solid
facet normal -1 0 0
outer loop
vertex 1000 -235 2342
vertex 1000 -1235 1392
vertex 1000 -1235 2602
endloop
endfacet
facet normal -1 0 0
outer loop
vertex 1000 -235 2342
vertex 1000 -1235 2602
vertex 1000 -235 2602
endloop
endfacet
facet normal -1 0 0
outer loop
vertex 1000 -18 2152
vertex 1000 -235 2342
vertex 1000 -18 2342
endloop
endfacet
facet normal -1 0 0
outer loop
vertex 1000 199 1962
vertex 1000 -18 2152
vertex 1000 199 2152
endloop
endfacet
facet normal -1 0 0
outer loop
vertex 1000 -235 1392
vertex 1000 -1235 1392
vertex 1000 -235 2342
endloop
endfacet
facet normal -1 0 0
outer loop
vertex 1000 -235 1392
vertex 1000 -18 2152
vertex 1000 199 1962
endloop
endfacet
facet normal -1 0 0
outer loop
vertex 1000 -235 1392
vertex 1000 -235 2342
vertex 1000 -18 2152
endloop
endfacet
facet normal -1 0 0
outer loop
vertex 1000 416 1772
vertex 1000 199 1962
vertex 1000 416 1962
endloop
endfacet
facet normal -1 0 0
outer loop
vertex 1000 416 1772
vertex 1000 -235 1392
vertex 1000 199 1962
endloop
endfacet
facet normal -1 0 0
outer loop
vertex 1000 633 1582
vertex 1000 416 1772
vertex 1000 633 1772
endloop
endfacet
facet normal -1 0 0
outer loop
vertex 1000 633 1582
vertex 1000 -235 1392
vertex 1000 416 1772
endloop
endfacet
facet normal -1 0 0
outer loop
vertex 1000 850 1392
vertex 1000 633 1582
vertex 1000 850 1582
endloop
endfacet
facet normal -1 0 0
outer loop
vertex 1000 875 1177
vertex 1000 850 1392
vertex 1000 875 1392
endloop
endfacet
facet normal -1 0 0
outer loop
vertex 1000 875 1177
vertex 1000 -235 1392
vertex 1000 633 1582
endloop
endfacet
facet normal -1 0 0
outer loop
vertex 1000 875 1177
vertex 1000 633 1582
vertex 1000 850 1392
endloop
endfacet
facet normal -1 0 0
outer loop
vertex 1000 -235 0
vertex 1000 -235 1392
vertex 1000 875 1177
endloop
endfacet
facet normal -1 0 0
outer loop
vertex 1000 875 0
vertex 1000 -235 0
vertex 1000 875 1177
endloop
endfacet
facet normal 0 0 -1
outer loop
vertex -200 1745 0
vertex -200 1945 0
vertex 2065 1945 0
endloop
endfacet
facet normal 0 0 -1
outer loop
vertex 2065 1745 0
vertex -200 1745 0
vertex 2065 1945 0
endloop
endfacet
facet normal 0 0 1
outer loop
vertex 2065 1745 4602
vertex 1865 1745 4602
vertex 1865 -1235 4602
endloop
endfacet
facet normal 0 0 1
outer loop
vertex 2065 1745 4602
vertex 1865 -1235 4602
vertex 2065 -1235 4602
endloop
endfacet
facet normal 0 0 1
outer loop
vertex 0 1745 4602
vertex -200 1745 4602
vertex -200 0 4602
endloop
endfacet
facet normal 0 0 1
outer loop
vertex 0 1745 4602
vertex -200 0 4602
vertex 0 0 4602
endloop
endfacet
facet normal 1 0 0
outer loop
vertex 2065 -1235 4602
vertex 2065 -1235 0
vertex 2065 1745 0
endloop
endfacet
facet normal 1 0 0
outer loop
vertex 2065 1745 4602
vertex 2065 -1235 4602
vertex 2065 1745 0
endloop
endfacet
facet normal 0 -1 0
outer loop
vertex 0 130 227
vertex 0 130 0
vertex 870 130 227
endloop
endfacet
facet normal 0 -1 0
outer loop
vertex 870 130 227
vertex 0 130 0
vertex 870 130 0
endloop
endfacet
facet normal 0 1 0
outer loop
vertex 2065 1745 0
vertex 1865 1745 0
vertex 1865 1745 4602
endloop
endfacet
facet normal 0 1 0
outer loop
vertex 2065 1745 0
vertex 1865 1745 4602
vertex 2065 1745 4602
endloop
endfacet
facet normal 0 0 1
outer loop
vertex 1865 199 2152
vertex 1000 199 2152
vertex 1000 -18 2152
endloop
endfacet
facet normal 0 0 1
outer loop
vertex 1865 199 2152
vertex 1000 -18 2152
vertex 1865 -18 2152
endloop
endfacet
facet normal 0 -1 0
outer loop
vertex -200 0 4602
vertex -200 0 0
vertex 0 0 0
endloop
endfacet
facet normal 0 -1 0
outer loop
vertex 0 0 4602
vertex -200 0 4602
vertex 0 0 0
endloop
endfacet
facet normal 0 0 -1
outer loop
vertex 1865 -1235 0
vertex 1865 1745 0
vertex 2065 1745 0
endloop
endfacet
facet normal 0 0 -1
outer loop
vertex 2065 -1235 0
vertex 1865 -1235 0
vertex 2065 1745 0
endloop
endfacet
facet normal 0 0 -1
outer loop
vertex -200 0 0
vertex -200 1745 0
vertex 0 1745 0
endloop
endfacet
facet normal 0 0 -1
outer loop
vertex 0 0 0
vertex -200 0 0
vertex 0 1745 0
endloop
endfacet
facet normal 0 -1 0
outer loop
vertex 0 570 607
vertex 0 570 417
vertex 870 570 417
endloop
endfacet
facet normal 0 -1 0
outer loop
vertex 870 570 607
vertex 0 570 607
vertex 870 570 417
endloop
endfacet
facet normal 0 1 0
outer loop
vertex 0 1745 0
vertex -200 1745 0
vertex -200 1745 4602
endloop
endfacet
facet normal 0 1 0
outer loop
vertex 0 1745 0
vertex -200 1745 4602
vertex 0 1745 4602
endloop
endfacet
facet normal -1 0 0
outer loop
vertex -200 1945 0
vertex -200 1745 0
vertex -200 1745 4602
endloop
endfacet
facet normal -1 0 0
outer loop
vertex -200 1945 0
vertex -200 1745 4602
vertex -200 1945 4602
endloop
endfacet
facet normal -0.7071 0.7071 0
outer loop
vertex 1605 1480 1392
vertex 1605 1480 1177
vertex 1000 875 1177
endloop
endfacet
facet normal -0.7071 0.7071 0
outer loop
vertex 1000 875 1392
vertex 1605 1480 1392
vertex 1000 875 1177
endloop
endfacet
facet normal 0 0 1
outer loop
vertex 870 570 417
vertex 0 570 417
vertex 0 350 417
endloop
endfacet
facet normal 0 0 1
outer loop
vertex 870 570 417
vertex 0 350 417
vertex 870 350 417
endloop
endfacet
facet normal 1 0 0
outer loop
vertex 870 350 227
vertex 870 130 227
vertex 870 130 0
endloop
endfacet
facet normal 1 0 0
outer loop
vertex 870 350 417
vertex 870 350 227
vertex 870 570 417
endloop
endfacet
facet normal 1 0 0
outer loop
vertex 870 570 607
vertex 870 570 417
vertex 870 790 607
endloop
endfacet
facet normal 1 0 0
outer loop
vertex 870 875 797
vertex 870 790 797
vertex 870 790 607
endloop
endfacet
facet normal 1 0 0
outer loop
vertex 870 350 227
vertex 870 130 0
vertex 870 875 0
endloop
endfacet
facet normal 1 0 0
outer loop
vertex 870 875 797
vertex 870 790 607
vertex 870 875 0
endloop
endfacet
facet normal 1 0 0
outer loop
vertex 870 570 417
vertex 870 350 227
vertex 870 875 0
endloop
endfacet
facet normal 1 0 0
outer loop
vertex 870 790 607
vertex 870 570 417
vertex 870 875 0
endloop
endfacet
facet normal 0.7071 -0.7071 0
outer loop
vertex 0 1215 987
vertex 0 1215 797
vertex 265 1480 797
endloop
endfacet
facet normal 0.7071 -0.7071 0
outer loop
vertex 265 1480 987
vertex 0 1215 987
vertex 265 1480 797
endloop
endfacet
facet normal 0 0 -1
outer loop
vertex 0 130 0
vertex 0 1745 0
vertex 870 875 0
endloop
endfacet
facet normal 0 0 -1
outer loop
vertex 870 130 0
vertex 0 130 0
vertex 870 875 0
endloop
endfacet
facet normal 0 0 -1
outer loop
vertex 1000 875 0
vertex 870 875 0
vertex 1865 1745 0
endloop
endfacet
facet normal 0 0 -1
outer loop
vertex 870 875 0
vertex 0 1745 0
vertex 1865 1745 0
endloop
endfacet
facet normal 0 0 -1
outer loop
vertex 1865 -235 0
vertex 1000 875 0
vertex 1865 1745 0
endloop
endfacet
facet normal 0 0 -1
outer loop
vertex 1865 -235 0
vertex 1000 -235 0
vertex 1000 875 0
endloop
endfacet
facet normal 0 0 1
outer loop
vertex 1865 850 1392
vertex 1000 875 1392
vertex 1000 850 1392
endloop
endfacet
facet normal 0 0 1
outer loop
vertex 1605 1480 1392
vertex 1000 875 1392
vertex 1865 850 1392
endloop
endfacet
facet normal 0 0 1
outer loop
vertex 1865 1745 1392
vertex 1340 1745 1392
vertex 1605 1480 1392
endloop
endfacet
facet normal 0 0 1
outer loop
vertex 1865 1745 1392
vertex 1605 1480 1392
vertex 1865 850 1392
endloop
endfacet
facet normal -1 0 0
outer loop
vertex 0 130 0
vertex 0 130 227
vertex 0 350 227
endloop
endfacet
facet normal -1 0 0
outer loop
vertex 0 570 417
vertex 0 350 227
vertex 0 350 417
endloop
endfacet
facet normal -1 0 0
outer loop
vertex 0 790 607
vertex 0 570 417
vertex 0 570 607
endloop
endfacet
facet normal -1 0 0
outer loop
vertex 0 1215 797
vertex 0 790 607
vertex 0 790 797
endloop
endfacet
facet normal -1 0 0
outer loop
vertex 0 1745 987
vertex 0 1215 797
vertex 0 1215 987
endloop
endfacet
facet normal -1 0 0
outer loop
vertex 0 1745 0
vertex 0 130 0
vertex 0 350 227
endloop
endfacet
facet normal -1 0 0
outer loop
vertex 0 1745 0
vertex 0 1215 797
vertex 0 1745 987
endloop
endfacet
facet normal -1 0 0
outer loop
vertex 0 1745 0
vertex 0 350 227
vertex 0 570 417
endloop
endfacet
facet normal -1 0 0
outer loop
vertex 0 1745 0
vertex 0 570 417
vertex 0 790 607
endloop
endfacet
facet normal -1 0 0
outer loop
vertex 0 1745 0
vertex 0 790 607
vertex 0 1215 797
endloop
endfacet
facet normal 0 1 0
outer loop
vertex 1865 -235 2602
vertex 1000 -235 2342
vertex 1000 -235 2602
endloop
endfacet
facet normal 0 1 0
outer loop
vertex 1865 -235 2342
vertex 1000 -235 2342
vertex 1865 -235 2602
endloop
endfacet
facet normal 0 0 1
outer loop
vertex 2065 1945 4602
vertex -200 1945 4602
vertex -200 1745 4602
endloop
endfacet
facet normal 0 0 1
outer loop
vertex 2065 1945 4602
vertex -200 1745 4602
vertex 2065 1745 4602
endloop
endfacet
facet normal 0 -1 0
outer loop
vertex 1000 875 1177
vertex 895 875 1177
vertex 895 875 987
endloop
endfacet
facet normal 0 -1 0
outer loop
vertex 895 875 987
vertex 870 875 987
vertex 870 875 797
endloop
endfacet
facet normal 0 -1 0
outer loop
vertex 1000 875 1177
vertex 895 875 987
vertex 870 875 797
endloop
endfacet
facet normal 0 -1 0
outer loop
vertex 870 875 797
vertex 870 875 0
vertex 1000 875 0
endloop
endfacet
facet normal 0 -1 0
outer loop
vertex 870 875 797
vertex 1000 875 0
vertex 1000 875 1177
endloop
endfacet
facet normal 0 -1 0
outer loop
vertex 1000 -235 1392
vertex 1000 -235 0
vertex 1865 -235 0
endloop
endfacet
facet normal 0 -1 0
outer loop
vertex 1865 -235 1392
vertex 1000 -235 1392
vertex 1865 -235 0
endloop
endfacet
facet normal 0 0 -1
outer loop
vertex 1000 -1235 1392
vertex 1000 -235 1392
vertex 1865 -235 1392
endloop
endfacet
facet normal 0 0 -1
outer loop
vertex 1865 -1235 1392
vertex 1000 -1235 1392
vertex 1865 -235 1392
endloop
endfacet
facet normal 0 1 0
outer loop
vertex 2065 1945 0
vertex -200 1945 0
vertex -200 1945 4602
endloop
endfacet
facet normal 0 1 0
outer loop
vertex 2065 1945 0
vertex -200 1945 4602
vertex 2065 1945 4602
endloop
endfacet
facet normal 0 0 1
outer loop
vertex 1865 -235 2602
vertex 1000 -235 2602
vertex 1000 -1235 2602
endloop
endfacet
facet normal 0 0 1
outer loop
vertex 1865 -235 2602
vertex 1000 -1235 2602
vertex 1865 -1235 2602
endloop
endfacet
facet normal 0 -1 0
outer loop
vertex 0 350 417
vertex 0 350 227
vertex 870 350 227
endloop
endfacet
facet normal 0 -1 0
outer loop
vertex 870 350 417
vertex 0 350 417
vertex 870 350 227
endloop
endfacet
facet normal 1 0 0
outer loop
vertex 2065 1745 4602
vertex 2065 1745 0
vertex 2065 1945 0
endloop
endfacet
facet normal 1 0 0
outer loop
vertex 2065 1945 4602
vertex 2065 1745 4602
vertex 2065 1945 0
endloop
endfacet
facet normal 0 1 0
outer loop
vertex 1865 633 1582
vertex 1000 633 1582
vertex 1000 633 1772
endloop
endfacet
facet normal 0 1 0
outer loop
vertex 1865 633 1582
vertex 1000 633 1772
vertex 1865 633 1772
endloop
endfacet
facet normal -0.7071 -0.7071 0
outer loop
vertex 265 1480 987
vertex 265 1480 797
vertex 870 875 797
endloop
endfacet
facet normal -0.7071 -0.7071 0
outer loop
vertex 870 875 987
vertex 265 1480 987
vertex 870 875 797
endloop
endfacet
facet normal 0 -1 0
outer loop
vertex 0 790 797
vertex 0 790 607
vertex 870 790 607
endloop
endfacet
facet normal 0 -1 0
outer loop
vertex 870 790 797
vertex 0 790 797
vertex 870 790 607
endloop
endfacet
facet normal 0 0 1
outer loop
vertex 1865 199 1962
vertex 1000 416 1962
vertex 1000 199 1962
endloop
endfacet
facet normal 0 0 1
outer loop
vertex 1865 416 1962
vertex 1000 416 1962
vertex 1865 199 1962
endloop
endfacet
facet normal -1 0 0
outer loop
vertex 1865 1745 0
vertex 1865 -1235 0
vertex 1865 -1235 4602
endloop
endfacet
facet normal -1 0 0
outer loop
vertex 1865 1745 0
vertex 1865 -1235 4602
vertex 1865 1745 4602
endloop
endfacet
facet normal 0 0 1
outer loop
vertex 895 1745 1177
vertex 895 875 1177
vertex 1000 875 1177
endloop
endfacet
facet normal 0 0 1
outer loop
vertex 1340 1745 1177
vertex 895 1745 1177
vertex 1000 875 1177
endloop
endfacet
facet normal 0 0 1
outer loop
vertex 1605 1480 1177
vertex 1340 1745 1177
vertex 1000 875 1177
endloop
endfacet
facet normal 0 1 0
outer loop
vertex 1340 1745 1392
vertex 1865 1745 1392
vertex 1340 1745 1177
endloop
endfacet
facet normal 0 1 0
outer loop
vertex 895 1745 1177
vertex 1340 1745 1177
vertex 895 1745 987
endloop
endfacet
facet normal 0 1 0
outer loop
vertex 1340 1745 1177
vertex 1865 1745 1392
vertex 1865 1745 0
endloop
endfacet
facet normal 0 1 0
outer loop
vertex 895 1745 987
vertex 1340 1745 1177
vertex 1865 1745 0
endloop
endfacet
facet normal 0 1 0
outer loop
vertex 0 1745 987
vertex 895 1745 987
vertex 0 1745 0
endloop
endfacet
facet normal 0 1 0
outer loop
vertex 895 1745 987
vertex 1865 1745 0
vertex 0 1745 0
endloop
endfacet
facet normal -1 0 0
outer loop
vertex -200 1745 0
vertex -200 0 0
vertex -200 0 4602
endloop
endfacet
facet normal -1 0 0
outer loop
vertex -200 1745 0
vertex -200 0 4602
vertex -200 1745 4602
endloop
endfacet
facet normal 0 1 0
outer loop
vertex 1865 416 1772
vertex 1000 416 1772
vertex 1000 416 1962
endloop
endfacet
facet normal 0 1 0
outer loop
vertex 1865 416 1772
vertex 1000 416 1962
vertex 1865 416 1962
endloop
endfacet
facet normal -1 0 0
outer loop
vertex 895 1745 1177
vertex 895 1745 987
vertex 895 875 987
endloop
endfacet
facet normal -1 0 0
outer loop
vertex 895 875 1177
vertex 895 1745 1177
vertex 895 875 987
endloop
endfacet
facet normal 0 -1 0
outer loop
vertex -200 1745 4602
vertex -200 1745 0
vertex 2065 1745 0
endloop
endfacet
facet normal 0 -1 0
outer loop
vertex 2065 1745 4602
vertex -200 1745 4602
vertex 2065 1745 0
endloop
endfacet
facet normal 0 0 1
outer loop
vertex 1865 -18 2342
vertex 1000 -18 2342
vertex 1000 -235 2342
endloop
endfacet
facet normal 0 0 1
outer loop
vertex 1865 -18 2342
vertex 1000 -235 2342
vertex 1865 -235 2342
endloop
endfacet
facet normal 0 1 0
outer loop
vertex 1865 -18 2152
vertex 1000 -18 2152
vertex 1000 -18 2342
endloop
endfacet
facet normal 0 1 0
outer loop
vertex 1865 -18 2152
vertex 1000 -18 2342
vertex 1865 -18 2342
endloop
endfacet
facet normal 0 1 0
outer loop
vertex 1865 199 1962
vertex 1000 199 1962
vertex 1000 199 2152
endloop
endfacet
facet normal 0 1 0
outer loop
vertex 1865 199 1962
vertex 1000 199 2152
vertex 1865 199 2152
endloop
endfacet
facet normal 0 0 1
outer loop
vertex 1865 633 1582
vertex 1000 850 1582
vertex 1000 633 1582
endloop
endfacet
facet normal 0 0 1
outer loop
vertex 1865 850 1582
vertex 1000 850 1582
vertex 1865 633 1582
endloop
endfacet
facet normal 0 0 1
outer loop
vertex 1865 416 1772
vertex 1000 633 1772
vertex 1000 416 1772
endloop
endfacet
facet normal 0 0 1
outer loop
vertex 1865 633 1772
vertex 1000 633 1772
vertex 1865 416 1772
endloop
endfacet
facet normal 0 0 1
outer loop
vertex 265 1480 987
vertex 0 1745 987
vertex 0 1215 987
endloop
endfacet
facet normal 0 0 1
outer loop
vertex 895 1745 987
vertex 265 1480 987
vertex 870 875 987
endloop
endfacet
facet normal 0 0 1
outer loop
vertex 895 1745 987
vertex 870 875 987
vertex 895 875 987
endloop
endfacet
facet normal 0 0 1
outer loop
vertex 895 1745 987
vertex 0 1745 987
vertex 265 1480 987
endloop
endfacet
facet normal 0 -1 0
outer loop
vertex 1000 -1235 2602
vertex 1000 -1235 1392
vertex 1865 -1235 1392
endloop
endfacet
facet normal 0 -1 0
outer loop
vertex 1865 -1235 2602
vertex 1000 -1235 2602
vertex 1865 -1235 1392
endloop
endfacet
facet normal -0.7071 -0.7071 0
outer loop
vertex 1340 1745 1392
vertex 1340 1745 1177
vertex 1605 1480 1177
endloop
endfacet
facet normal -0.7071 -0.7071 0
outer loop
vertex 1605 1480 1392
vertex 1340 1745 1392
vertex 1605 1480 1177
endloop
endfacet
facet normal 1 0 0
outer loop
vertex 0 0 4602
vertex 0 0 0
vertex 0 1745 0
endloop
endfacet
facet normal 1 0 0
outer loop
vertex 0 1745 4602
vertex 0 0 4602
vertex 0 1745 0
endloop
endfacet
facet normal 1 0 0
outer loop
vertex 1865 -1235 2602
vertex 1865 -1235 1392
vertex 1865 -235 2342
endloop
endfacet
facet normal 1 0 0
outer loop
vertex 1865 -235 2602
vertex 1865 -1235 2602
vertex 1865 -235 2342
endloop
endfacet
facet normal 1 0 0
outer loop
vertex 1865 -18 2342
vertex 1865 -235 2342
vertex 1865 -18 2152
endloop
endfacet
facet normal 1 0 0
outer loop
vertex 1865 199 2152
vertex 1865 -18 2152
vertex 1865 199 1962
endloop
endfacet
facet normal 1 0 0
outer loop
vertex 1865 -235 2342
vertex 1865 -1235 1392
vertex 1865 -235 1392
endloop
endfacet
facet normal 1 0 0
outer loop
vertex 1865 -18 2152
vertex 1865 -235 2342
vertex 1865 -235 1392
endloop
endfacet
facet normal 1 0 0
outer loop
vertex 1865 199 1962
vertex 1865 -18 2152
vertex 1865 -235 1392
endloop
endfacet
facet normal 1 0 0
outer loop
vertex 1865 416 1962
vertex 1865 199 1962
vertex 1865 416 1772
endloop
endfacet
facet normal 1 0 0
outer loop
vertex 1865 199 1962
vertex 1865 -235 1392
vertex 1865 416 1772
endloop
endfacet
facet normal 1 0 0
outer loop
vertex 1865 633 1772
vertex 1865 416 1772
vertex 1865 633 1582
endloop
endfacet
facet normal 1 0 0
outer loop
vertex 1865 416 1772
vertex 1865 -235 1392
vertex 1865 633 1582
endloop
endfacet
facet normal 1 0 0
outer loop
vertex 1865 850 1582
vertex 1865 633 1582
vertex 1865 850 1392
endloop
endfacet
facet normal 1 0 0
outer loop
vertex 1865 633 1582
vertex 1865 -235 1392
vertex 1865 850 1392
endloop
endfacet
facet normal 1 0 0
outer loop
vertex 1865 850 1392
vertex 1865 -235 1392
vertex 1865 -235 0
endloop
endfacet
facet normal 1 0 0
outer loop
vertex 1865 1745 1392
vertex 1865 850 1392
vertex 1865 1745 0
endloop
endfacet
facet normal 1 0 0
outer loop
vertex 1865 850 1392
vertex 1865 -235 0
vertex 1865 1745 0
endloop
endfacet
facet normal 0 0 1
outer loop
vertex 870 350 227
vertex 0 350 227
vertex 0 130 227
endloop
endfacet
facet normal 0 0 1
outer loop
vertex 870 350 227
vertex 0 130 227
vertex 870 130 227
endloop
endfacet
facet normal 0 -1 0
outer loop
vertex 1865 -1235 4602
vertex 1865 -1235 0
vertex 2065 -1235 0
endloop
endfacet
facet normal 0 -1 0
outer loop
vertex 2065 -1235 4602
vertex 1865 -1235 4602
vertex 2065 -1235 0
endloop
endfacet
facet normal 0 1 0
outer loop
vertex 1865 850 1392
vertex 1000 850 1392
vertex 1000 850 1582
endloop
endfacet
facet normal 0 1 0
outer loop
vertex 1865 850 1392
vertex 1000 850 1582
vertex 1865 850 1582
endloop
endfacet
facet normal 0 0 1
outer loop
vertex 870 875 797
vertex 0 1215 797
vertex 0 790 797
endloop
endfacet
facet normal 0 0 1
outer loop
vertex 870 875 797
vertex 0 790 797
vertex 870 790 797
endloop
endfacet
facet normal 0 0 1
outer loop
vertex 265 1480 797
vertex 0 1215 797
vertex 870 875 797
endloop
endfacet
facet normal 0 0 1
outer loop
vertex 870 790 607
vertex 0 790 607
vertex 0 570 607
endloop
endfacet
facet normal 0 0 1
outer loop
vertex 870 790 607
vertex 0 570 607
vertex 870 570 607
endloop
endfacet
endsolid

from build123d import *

# Parameters (mm, degrees)
F1_DEPTH  = 987
F2_DEPTH  = 797
F0_W      = 870
F0_H      = 220
F3_DEPTH  = 607
F4_DEPTH  = 417
F5_DEPTH  = 227
F6_DEPTH  = 1177
F7_DEPTH  = 1392
F0_W_2    = 865
F0_H_2    = 217
F8_DEPTH  = 1582
F9_DEPTH  = 1772
F10_DEPTH = 1962
F11_DEPTH = 2152
F12_DEPTH = 2342
F13_W     = 865
F13_H     = 1000
F14_DEPTH = 1210
F15_W     = 200
F15_H     = 1745
F16_DEPTH = 4602
F17_W     = 200
F17_H     = 2980
F18_DEPTH = 4602
F19_W     = 2265
F19_H     = 200
F20_DEPTH = 4602


with BuildPart() as f1:
    # F0 (on Top) → F1 (new body)
    with BuildSketch(Plane.XY):
        Polygon((0, 1745), (0, 1215), (265, 1480), (870, 875), (895, 875), (895, 1745), align=None)
    extrude(amount=F1_DEPTH)

    # F0 (on Top) → F2 (join, through all)
    with BuildSketch(Plane.XY):
        Polygon((0, 1215), (0, 790), (870, 790), (870, 875), (265, 1480), align=None)
    extrude(amount=F2_DEPTH)

    # F0 (on Top) → F3 (join, through all)
    with BuildSketch(Plane.XY):
        with Locations((435, 680)):
            Rectangle(F0_W, F0_H)
    extrude(amount=F3_DEPTH)

    # F0 (on Top) → F4 (join, through all)
    with BuildSketch(Plane.XY):
        with Locations((435, 460)):
            Rectangle(F0_W, F0_H)
    extrude(amount=F4_DEPTH)

    # F0 (on Top) → F5 (join, through all)
    with BuildSketch(Plane.XY):
        with Locations((435, 240)):
            Rectangle(F0_W, F0_H)
    extrude(amount=F5_DEPTH)

    # F0 (on Top) → F6 (join, through all)
    with BuildSketch(Plane.XY):
        Polygon((1340, 1745), (895, 1745), (895, 875), (1000, 875), (1605, 1480), align=None)
    extrude(amount=F6_DEPTH)

    # F0 (on Top) → F7 (join, through all)
    with BuildSketch(Plane.XY):
        Polygon((1865, 1745), (1340, 1745), (1605, 1480), (1000, 875), (1000, 850), (1865, 850), align=None)
    extrude(amount=F7_DEPTH)

    # F0 (on Top) → F8 (join, through all)
    with BuildSketch(Plane.XY):
        with Locations((1432.5, 741.5)):
            Rectangle(F0_W_2, F0_H_2)
    extrude(amount=F8_DEPTH)

    # F0 (on Top) → F9 (join, through all)
    with BuildSketch(Plane.XY):
        with Locations((1432.5, 524.5)):
            Rectangle(F0_W_2, F0_H_2)
    extrude(amount=F9_DEPTH)

    # F0 (on Top) → F10 (join, through all)
    with BuildSketch(Plane.XY):
        with Locations((1432.5, 307.5)):
            Rectangle(F0_W_2, F0_H_2)
    extrude(amount=F10_DEPTH)

    # F0 (on Top) → F11 (join, through all)
    with BuildSketch(Plane.XY):
        with Locations((1432.5, 90.5)):
            Rectangle(F0_W_2, F0_H_2)
    extrude(amount=F11_DEPTH)

    # F0 (on Top) → F12 (join, through all)
    with BuildSketch(Plane.XY):
        with Locations((1432.5, -126.5)):
            Rectangle(F0_W_2, F0_H_2)
    extrude(amount=F12_DEPTH)

    # F13 (on face) → F14 (join)
    with BuildSketch(Plane.XY.offset(1392)):
        with Locations((1432.5, -735)):
            Rectangle(F13_W, F13_H)
    extrude(amount=F14_DEPTH)


with BuildPart() as f16:
    # F15 (on Top) → F16 (new body, through all)
    with BuildSketch(Plane.XY):
        with Locations((-100, 872.5)):
            Rectangle(F15_W, F15_H)
    extrude(amount=F16_DEPTH)


with BuildPart() as f18:
    # F17 (on Top) → F18 (new body, through all)
    with BuildSketch(Plane.XY):
        with Locations((1965, 255)):
            Rectangle(F17_W, F17_H)
    extrude(amount=F18_DEPTH)


with BuildPart() as f20:
    # F19 (on Top) → F20 (new body, through all)
    with BuildSketch(Plane.XY):
        with Locations((932.5, 1845)):
            Rectangle(F19_W, F19_H)
    extrude(amount=F20_DEPTH)


solid = Compound([f1.part, f16.part, f18.part, f20.part])
